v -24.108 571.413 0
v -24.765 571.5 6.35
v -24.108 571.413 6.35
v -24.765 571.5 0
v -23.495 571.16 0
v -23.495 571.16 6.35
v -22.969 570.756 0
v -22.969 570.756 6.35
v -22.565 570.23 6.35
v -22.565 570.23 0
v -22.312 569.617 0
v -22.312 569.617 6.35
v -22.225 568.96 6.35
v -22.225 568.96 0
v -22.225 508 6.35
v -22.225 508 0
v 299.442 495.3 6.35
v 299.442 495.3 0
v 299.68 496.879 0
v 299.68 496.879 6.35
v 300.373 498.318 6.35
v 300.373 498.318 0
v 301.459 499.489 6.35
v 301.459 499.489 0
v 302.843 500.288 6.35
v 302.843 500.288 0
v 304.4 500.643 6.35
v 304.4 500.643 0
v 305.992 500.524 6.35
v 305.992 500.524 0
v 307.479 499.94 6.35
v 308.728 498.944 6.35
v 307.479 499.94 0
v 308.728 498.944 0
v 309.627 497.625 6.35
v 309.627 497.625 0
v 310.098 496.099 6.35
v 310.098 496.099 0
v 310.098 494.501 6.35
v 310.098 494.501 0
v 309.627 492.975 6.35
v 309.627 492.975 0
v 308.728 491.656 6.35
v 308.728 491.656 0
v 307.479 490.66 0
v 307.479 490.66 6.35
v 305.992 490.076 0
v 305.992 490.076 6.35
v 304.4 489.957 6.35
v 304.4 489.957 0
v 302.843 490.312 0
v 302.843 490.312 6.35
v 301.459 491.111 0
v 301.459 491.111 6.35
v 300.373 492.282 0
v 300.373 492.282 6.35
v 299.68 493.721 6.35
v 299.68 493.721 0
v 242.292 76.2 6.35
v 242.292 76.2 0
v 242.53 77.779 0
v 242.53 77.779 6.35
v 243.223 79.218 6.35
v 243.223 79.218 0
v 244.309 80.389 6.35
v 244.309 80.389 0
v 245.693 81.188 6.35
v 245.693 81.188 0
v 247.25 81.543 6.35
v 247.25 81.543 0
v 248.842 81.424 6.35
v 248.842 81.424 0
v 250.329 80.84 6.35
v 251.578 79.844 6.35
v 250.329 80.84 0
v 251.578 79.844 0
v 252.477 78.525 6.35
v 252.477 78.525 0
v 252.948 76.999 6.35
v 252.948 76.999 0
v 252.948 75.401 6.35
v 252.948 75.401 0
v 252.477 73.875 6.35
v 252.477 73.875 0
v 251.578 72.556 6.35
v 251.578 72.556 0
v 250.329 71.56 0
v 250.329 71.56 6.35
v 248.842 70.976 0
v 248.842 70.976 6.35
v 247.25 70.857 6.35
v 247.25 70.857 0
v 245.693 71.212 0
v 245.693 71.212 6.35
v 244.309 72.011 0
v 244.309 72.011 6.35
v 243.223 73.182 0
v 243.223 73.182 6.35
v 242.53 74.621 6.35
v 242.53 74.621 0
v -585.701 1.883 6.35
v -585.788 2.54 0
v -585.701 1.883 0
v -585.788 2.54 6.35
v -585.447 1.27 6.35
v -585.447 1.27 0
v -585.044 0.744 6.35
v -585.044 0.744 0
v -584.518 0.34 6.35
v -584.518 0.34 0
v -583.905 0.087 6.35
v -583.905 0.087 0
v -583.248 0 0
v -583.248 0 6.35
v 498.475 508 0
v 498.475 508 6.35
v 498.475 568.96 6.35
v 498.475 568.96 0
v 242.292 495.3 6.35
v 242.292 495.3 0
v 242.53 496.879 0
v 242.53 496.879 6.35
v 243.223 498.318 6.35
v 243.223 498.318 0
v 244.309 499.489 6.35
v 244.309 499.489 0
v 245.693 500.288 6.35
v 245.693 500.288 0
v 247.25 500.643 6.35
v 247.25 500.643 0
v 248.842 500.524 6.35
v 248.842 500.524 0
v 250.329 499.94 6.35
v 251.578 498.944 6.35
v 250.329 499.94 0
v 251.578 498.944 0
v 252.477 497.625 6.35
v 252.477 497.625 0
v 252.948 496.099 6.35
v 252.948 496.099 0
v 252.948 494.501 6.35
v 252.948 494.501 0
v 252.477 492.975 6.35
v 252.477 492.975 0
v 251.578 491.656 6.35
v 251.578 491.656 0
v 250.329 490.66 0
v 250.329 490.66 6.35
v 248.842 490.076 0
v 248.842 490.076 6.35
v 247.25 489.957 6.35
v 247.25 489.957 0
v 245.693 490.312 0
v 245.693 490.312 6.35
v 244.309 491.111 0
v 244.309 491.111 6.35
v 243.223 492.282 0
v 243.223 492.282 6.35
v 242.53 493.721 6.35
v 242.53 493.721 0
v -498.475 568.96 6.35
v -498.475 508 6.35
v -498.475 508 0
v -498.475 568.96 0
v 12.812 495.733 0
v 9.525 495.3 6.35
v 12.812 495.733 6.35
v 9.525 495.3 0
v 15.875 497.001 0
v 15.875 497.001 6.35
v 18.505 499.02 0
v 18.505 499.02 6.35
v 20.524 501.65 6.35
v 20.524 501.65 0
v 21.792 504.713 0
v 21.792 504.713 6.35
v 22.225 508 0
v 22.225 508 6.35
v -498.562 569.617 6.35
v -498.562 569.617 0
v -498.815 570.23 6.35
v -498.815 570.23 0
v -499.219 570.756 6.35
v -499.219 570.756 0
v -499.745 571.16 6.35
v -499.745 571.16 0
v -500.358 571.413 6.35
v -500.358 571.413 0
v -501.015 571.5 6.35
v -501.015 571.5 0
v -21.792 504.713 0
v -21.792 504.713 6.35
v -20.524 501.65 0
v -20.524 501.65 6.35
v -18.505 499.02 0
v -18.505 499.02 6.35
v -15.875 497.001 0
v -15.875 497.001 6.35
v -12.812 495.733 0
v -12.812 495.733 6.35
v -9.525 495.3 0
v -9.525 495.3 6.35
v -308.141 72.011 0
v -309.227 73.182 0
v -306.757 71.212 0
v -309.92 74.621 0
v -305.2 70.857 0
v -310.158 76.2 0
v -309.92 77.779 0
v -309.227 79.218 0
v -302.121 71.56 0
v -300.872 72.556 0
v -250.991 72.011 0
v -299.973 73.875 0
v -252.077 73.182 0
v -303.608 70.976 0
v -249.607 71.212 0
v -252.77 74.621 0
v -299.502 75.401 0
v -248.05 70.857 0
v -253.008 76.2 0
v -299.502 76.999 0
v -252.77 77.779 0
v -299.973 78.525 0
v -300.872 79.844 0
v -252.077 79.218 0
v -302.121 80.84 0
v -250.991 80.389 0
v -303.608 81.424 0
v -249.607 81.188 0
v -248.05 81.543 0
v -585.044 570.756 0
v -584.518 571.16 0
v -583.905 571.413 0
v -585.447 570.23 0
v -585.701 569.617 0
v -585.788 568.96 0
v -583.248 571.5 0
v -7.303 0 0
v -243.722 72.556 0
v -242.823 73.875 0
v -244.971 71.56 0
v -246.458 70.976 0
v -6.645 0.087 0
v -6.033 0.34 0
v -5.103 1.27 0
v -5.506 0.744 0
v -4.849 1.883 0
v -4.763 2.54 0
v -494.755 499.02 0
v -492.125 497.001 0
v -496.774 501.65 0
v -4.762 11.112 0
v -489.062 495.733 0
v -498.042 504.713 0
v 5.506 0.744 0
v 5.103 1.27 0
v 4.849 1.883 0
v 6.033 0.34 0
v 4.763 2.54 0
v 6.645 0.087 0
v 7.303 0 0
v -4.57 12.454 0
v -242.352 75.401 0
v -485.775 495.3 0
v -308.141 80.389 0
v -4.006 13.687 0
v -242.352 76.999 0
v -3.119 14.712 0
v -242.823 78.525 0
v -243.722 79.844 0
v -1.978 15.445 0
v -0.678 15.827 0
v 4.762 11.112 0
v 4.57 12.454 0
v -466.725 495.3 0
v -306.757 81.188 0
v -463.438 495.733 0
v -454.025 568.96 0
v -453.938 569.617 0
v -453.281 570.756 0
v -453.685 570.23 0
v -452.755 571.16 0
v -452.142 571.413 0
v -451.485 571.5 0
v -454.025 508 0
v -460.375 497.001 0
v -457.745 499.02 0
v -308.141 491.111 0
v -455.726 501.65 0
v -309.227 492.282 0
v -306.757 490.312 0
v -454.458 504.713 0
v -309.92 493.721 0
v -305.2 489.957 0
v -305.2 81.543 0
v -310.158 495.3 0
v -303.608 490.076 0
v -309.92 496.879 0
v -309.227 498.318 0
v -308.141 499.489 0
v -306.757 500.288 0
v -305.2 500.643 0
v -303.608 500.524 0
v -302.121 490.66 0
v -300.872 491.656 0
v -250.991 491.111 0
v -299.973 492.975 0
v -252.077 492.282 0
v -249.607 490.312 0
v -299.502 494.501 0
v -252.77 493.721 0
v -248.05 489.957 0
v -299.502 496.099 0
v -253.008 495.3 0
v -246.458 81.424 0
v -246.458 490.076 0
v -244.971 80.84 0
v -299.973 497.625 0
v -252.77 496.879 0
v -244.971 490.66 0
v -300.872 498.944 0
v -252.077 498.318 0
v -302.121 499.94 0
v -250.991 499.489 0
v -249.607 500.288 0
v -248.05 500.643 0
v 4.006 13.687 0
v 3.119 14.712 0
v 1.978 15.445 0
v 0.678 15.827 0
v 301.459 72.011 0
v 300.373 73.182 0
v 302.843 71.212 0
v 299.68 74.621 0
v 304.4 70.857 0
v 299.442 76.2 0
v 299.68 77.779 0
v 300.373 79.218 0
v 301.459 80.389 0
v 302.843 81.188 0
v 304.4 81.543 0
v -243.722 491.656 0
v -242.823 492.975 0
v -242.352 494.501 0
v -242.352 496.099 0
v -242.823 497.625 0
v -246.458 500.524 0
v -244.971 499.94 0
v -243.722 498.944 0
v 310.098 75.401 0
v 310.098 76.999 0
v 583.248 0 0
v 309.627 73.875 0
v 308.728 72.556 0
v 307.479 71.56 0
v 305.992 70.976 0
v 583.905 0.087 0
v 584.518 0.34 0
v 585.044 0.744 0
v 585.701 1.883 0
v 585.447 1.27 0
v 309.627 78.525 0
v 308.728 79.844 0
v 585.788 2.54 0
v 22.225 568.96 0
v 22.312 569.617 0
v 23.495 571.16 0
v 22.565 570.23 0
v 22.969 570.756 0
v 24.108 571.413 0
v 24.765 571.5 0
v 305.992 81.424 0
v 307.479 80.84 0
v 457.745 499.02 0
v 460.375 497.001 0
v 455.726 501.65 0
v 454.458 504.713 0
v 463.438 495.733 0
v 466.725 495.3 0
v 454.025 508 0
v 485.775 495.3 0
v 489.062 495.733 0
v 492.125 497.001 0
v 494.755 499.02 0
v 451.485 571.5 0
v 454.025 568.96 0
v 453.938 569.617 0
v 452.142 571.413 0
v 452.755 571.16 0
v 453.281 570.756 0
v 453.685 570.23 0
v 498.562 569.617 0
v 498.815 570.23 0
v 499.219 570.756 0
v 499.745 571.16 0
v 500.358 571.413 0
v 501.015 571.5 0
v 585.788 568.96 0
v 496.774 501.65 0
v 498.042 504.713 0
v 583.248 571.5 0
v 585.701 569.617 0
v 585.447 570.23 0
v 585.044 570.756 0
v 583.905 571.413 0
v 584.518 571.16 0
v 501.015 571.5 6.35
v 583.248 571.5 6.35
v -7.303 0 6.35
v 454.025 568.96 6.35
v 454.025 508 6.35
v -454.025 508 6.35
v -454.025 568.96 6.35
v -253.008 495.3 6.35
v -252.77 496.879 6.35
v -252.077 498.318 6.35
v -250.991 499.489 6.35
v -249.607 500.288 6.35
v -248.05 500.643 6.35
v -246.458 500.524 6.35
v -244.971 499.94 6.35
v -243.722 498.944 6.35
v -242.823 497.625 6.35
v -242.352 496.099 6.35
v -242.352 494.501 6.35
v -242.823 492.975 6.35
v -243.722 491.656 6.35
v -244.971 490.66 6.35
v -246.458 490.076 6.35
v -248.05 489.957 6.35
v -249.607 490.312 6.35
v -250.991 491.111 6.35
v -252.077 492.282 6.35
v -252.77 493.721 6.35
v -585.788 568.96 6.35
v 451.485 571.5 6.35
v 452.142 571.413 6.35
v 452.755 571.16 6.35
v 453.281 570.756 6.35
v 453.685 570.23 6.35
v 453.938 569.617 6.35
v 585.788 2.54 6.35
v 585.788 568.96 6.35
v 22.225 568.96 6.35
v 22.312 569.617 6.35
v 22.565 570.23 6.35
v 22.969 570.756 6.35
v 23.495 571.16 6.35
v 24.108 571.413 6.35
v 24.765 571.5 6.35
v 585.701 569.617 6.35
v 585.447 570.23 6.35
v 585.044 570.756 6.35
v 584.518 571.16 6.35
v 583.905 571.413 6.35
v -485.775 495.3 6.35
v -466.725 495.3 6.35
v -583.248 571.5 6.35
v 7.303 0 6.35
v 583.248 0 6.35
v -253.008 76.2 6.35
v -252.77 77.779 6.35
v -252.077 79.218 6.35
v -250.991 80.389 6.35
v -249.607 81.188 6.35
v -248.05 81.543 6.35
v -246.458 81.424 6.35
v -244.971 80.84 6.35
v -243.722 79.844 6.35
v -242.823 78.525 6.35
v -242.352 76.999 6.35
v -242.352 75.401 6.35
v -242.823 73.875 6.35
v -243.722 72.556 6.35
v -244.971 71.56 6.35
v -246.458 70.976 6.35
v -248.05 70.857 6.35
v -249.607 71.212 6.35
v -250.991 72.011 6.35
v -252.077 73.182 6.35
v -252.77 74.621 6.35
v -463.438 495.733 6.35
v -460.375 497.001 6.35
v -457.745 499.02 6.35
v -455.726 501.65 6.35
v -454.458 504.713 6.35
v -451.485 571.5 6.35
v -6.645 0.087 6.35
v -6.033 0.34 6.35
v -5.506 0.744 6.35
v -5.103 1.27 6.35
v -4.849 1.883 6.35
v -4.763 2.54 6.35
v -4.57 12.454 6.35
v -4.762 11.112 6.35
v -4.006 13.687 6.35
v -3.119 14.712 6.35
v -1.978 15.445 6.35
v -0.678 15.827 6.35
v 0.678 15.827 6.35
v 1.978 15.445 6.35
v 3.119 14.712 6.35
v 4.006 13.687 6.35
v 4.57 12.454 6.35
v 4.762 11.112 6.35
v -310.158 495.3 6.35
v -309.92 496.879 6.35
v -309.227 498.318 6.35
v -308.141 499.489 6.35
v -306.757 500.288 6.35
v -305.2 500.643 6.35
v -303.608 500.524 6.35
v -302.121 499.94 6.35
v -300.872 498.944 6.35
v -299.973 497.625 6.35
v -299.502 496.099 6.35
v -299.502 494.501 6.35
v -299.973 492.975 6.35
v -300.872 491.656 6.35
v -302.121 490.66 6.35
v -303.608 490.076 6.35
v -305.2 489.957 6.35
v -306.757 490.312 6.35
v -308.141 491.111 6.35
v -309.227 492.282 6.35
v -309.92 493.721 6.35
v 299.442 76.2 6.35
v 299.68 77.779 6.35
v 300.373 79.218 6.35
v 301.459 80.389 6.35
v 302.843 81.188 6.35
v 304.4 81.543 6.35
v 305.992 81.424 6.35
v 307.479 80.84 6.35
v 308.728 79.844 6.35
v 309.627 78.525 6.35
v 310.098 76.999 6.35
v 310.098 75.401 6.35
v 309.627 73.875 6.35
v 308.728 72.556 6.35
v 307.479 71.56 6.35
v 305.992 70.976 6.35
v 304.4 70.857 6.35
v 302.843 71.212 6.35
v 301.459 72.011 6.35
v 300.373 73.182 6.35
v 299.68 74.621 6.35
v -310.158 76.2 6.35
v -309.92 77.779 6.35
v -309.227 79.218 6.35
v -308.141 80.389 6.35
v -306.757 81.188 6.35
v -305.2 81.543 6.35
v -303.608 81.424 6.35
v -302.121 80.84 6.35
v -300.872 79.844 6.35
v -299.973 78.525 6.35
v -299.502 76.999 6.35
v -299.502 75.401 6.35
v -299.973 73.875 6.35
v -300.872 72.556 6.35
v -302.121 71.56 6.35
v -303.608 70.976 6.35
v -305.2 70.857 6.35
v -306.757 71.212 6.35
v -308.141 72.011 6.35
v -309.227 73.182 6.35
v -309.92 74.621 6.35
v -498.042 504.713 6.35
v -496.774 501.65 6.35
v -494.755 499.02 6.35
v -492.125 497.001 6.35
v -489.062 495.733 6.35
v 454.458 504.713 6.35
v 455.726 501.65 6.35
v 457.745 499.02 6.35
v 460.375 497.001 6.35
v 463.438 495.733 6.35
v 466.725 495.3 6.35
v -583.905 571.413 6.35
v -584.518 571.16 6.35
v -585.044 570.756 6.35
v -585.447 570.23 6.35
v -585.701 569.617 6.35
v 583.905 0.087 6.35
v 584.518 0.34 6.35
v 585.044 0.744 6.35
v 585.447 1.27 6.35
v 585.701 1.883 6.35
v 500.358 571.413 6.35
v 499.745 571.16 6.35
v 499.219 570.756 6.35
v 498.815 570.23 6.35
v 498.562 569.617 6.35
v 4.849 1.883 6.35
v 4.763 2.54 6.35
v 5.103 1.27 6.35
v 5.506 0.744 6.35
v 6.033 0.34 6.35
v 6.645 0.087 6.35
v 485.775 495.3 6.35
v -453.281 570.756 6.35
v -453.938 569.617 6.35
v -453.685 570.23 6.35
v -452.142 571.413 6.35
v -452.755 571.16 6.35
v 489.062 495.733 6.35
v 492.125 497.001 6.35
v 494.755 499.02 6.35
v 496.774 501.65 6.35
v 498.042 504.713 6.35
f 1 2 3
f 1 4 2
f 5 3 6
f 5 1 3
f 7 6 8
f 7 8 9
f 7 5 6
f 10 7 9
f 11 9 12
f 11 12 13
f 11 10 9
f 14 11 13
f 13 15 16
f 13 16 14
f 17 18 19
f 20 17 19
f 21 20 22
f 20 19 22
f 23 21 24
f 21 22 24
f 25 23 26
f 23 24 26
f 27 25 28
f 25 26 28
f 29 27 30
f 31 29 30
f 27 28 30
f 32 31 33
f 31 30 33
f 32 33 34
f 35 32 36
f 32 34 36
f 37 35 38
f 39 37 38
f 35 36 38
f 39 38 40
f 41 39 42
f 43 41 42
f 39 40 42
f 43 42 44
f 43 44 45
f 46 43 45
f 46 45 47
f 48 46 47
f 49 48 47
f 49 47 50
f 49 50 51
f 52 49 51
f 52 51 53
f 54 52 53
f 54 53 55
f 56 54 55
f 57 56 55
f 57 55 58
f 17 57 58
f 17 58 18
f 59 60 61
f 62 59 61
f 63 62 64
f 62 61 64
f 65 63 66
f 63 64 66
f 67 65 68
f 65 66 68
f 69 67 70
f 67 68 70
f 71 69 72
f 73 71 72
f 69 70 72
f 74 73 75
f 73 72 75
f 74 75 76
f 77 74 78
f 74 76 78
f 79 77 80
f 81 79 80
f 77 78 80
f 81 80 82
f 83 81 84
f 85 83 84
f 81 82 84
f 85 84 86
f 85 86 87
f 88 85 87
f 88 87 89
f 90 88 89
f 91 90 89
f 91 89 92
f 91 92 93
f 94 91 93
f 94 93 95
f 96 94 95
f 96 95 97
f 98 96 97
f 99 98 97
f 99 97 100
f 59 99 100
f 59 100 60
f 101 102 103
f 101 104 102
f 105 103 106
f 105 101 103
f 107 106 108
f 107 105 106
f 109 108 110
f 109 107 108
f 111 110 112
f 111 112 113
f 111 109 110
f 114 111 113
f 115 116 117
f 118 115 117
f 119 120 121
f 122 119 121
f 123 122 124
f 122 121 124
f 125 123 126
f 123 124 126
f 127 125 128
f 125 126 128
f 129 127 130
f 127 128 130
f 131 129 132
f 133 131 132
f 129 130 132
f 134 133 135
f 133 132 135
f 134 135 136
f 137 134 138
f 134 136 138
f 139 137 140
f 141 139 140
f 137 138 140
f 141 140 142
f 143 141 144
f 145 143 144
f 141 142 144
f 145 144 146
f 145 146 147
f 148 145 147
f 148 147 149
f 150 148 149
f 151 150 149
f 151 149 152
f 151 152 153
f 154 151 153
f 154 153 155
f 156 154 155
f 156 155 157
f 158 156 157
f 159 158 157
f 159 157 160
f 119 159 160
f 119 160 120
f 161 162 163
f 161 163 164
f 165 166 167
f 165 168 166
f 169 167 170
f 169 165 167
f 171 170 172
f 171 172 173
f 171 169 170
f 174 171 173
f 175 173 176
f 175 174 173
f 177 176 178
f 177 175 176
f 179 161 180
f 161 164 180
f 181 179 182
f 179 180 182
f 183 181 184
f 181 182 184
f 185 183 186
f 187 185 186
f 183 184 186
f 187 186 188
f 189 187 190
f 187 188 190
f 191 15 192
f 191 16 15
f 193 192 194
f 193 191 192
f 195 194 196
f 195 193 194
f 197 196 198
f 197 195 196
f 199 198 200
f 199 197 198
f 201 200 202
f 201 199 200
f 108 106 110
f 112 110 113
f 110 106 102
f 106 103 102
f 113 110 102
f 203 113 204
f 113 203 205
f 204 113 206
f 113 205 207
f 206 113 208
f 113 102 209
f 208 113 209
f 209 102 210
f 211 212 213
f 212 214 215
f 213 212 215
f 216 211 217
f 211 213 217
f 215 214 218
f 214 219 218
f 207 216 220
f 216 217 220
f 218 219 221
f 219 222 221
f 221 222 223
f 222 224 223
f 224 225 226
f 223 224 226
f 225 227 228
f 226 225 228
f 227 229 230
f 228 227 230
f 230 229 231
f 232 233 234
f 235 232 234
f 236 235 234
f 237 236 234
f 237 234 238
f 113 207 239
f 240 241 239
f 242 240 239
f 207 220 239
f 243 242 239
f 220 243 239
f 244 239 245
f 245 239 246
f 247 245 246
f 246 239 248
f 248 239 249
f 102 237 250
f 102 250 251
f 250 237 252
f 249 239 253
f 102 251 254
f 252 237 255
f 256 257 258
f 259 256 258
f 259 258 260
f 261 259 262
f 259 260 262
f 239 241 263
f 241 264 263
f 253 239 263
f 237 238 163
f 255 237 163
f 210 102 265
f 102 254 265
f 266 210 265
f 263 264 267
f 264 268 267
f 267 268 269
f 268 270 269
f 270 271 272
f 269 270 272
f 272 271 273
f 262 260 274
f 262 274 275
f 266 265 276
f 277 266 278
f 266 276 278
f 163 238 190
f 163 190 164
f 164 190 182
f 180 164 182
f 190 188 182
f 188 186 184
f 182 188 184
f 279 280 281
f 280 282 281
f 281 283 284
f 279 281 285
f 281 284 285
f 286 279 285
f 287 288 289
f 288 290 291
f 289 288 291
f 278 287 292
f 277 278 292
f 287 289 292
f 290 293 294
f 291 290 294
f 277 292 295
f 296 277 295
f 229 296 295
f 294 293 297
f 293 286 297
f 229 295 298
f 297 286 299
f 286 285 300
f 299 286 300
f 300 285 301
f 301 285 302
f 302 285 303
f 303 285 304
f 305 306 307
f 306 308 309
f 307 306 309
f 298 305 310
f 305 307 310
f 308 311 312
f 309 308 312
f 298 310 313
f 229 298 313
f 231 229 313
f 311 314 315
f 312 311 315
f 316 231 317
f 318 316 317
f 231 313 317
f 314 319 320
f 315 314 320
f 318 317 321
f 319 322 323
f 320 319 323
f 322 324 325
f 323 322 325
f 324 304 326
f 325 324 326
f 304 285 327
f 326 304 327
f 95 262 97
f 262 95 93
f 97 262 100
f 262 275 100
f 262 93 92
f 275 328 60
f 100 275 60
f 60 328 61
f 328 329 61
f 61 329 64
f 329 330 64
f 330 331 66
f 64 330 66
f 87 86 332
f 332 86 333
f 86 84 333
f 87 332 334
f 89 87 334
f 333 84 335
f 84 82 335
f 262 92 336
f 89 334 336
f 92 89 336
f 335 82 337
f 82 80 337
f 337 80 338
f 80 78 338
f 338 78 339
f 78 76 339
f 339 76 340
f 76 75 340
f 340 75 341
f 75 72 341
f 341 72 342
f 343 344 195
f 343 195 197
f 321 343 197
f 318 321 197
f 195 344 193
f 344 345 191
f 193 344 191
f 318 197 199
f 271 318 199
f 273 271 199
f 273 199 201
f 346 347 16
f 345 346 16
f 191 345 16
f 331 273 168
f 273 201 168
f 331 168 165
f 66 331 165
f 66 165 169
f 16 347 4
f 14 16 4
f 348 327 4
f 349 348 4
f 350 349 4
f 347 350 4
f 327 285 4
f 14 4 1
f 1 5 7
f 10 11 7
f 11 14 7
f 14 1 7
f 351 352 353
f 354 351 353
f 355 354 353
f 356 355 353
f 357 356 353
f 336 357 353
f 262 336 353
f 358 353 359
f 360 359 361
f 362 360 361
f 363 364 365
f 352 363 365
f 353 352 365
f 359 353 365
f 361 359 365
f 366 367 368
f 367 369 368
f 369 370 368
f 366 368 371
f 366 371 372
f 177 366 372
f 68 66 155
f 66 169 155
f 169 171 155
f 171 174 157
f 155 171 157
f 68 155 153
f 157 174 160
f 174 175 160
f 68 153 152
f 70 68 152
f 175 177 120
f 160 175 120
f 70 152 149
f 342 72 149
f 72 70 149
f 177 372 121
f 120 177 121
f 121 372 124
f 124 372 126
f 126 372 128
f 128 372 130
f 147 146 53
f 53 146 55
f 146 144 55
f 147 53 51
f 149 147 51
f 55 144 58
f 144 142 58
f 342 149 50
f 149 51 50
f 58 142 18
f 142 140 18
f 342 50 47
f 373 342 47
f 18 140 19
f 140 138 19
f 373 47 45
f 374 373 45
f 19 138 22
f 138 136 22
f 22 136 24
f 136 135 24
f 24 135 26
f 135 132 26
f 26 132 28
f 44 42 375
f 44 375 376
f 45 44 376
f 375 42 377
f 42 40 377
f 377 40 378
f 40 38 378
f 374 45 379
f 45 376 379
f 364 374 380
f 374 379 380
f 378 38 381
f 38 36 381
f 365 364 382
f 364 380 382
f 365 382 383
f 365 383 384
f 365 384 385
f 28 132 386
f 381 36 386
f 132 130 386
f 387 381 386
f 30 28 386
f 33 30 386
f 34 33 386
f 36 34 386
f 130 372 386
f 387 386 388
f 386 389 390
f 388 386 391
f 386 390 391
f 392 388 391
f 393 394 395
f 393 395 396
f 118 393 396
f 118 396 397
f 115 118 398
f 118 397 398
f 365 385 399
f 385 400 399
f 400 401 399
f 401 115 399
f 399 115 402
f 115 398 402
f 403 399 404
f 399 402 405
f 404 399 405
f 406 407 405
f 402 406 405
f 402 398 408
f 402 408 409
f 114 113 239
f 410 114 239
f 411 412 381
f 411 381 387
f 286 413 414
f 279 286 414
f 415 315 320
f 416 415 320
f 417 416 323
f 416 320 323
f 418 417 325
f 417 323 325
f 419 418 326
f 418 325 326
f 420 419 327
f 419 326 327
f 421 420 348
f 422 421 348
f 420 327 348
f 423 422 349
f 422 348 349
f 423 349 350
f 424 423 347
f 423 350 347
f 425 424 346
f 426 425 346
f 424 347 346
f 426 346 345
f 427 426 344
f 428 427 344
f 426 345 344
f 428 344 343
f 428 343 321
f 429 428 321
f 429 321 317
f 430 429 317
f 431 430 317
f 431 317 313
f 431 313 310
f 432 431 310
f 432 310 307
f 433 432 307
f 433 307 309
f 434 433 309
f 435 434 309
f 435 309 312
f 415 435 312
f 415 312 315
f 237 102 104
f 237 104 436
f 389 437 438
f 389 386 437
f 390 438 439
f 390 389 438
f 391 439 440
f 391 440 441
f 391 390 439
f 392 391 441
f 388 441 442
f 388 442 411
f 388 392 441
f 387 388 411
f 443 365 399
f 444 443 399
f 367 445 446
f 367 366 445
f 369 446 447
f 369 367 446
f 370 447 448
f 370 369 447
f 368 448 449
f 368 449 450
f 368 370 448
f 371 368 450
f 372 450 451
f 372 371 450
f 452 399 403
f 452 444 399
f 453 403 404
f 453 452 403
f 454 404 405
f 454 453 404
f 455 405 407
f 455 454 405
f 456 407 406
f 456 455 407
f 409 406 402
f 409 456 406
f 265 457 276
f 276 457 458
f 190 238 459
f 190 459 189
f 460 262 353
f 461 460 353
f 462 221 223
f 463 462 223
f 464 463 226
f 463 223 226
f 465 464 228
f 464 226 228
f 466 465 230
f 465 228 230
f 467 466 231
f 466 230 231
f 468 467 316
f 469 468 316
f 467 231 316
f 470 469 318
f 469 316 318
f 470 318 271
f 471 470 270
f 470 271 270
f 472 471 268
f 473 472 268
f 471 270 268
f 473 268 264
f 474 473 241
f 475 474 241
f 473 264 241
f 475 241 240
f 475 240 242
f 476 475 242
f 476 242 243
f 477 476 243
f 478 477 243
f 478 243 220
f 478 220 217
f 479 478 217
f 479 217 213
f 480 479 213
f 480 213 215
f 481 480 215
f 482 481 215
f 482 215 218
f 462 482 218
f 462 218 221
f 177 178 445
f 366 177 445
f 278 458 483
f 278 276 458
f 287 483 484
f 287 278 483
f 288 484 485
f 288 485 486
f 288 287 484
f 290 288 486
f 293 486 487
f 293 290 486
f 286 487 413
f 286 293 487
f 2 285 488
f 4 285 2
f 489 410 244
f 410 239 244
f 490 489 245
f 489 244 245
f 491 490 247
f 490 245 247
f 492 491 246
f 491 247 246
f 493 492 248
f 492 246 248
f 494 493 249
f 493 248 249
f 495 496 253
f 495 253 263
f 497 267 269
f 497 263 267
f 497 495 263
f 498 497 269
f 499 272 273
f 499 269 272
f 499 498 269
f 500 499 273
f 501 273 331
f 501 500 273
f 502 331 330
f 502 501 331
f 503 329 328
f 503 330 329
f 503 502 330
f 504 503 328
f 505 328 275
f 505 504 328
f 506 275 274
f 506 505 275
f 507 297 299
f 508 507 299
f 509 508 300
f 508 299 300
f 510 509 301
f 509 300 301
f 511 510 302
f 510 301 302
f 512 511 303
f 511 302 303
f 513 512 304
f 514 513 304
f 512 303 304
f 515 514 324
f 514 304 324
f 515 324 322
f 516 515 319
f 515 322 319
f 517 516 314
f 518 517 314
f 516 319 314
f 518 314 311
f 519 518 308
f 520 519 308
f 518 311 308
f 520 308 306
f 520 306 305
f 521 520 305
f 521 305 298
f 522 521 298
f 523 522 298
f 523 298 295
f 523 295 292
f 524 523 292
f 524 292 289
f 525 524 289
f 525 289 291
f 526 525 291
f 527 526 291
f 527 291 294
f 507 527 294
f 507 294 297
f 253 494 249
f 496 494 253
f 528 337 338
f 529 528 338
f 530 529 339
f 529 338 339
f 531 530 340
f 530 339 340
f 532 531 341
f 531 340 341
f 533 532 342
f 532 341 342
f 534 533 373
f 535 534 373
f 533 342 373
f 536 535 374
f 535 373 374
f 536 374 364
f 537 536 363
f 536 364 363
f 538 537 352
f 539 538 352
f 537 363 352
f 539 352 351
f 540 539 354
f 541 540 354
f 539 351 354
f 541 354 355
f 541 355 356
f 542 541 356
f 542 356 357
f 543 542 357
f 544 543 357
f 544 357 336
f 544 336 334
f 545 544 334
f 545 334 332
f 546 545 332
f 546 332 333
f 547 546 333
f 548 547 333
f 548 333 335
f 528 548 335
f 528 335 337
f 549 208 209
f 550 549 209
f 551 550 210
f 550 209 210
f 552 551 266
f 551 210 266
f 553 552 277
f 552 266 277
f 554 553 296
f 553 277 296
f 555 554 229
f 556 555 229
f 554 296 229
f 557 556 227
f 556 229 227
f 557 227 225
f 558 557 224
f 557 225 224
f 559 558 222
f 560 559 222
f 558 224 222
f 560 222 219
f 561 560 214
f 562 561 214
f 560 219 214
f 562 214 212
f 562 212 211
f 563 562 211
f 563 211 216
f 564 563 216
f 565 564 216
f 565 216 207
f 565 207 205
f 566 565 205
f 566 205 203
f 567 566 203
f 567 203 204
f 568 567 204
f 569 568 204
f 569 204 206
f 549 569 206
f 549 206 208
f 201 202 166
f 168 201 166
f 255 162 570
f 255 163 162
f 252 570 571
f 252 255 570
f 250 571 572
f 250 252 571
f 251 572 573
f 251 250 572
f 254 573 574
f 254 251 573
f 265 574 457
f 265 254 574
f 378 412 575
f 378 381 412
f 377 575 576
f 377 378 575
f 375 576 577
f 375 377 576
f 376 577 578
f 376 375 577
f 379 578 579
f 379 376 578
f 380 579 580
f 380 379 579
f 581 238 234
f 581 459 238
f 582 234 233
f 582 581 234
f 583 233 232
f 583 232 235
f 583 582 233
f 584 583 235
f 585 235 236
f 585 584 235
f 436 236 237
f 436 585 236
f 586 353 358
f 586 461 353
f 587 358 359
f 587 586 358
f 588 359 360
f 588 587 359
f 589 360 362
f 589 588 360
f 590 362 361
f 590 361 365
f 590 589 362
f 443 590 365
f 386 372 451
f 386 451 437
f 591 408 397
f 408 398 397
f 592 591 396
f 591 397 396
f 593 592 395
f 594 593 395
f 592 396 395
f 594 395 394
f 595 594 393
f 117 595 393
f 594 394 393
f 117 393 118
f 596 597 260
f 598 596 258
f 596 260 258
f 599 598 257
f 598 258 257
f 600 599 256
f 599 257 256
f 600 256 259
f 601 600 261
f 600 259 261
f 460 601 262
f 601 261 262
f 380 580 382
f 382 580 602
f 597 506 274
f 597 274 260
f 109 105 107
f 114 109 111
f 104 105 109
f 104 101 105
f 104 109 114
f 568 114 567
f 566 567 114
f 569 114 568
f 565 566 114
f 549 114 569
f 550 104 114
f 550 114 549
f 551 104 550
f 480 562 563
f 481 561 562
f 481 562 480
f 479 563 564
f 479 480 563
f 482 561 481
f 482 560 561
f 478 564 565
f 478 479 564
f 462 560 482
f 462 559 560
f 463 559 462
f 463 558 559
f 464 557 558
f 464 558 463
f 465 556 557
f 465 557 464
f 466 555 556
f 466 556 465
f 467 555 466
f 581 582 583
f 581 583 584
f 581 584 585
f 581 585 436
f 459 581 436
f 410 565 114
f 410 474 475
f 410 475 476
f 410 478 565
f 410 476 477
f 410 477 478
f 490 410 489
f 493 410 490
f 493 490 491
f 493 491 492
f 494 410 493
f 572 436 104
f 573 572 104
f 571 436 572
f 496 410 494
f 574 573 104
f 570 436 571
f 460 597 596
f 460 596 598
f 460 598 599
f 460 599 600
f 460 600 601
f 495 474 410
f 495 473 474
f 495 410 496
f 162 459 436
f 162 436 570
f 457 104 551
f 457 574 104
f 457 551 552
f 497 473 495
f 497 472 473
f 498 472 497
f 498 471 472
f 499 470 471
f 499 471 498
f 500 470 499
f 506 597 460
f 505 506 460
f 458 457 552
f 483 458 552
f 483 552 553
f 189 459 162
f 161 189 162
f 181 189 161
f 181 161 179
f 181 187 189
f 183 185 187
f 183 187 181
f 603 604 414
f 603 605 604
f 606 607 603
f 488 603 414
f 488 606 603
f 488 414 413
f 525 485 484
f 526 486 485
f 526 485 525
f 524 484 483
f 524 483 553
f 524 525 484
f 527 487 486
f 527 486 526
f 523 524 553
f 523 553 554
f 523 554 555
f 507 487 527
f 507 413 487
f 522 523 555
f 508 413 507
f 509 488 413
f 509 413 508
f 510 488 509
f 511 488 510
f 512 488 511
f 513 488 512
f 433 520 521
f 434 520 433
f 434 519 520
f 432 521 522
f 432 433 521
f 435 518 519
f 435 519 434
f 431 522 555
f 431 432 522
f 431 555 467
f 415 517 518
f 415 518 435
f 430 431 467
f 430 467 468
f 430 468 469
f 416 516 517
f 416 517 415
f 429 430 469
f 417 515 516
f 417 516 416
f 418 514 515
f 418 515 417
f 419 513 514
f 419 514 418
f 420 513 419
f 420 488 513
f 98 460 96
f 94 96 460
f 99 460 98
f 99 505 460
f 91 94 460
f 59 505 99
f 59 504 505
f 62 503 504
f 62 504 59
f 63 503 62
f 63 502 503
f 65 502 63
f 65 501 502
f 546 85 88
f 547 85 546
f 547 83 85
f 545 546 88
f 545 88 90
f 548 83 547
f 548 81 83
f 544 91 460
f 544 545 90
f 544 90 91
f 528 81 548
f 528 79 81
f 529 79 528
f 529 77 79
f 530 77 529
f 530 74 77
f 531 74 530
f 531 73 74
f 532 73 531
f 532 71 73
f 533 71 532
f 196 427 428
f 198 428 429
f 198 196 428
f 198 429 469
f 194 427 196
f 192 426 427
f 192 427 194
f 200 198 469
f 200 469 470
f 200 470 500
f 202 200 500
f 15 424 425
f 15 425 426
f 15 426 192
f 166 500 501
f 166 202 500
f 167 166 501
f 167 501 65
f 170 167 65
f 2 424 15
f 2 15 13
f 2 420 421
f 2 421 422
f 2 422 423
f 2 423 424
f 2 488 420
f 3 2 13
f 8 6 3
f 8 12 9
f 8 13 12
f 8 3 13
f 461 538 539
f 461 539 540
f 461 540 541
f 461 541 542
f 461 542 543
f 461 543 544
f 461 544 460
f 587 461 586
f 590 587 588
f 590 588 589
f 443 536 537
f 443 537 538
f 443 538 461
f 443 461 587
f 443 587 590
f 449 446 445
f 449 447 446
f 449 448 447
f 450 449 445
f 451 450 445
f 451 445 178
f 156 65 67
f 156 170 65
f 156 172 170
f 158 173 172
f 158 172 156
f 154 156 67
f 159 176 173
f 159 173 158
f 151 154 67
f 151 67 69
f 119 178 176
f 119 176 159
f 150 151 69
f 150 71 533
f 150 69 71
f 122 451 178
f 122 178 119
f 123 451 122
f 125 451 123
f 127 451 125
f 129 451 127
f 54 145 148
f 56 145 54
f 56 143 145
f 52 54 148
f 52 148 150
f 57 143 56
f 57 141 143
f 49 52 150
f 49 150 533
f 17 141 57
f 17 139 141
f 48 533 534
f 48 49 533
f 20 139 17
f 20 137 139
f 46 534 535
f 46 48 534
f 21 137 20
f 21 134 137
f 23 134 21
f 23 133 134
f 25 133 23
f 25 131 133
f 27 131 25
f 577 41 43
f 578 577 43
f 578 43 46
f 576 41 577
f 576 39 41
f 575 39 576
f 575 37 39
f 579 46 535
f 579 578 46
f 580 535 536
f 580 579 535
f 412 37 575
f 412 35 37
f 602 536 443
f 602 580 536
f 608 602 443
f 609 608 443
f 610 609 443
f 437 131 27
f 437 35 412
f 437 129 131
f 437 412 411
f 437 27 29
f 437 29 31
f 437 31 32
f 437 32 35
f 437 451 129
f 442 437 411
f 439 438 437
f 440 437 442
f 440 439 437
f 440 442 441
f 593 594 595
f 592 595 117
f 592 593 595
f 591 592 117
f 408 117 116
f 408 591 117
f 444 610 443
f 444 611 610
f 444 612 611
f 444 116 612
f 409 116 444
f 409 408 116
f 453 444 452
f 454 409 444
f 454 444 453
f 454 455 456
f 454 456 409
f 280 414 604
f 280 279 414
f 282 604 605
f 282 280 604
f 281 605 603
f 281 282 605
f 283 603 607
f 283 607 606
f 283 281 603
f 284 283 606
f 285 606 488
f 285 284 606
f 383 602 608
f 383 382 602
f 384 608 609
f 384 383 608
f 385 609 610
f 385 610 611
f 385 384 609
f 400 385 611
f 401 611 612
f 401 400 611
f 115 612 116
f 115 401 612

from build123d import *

# Parameters (mm, degrees)
SKETCH1_W                        = 1171.575
SKETCH1_H                        = 571.5
BOSS_EXTRUDE1_DEPTH              = 6.35
F_27_64_0_42188_DIAMETER_HOLE1_D = 10.715752
SKETCH5_W                        = 44.45
SKETCH5_H                        = 76.2
CUT_EXTRUDE1_DEPTH               = 7.35
CUT_EXTRUDE2_DEPTH               = 7.35
FILLET1_R                        = 12.7
FILLET2_R                        = 2.54


with BuildPart() as part:
    # Sketch1 → Boss-Extrude1 (new body)
    with BuildSketch(Plane.XY):
        with Locations((0, 285.75)):
            Rectangle(SKETCH1_W, SKETCH1_H)
    extrude(amount=BOSS_EXTRUDE1_DEPTH)

    # 27/64 (0.42188) Diameter Hole1 (through all)
    with Locations(Plane.XY.offset(6.35)):
        with Locations((304.8, 495.3), (-247.65, 495.3), (-304.8, 495.3), (-247.65, 76.2), (-304.8, 76.2), (247.65, 76.2), (304.8, 76.2), (247.65, 495.3)):
            Hole(F_27_64_0_42188_DIAMETER_HOLE1_D / 2)

    # Sketch5 → Cut-Extrude1 (cut, through all)
    with BuildSketch(Plane.XY.offset(6.35)):
        with Locations((-476.25, 533.4)):
            Rectangle(SKETCH5_W, SKETCH5_H)
        with Locations((0, 533.4)):
            Rectangle(SKETCH5_W, SKETCH5_H)
        with Locations((476.25, 533.4)):
            Rectangle(SKETCH5_W, SKETCH5_H)
    extrude(amount=-CUT_EXTRUDE1_DEPTH, mode=Mode.SUBTRACT)

    # Sketch6 → Cut-Extrude2 (cut, through all)
    with BuildSketch(Plane.XY.offset(6.35)):
        with BuildLine():
            Line((4.7625, 0), (-4.7625, 0))
            Line((-4.7625, 0), (-4.7625, 11.1125))
            ThreePointArc((-4.7625, 11.1125), (0, 15.875), (4.7625, 11.1125))
            Line((4.7625, 11.1125), (4.7625, 0))
        make_face()
    extrude(amount=-CUT_EXTRUDE2_DEPTH, mode=Mode.SUBTRACT)

    # Fillet1
    fillet1_edges = [part.edges().sort_by_distance(p)[0] for p in [
        (-454.025, 495.3, 3.175),
        (-498.475, 495.3, 3.175),
        (-22.225, 495.3, 3.175),
        (22.225, 495.3, 3.175),
        (454.025, 495.3, 3.175),
        (498.475, 495.3, 3.175),
    ]]
    fillet(fillet1_edges, radius=FILLET1_R)

    # Fillet2
    fillet2_edges = [part.edges().sort_by_distance(p)[0] for p in [
        (4.7625, 0, 3.175),
        (-4.7625, 0, 3.175),
        (-498.475, 571.5, 3.175),
        (-454.025, 571.5, 3.175),
        (-585.7875, 571.5, 3.175),
        (585.7875, 571.5, 3.175),
        (585.7875, 0, 3.175),
        (-22.225, 571.5, 3.175),
        (-585.7875, 0, 3.175),
        (22.225, 571.5, 3.175),
        (454.025, 571.5, 3.175),
        (498.475, 571.5, 3.175),
    ]]
    fillet(fillet2_edges, radius=FILLET2_R)


solid = part.part
